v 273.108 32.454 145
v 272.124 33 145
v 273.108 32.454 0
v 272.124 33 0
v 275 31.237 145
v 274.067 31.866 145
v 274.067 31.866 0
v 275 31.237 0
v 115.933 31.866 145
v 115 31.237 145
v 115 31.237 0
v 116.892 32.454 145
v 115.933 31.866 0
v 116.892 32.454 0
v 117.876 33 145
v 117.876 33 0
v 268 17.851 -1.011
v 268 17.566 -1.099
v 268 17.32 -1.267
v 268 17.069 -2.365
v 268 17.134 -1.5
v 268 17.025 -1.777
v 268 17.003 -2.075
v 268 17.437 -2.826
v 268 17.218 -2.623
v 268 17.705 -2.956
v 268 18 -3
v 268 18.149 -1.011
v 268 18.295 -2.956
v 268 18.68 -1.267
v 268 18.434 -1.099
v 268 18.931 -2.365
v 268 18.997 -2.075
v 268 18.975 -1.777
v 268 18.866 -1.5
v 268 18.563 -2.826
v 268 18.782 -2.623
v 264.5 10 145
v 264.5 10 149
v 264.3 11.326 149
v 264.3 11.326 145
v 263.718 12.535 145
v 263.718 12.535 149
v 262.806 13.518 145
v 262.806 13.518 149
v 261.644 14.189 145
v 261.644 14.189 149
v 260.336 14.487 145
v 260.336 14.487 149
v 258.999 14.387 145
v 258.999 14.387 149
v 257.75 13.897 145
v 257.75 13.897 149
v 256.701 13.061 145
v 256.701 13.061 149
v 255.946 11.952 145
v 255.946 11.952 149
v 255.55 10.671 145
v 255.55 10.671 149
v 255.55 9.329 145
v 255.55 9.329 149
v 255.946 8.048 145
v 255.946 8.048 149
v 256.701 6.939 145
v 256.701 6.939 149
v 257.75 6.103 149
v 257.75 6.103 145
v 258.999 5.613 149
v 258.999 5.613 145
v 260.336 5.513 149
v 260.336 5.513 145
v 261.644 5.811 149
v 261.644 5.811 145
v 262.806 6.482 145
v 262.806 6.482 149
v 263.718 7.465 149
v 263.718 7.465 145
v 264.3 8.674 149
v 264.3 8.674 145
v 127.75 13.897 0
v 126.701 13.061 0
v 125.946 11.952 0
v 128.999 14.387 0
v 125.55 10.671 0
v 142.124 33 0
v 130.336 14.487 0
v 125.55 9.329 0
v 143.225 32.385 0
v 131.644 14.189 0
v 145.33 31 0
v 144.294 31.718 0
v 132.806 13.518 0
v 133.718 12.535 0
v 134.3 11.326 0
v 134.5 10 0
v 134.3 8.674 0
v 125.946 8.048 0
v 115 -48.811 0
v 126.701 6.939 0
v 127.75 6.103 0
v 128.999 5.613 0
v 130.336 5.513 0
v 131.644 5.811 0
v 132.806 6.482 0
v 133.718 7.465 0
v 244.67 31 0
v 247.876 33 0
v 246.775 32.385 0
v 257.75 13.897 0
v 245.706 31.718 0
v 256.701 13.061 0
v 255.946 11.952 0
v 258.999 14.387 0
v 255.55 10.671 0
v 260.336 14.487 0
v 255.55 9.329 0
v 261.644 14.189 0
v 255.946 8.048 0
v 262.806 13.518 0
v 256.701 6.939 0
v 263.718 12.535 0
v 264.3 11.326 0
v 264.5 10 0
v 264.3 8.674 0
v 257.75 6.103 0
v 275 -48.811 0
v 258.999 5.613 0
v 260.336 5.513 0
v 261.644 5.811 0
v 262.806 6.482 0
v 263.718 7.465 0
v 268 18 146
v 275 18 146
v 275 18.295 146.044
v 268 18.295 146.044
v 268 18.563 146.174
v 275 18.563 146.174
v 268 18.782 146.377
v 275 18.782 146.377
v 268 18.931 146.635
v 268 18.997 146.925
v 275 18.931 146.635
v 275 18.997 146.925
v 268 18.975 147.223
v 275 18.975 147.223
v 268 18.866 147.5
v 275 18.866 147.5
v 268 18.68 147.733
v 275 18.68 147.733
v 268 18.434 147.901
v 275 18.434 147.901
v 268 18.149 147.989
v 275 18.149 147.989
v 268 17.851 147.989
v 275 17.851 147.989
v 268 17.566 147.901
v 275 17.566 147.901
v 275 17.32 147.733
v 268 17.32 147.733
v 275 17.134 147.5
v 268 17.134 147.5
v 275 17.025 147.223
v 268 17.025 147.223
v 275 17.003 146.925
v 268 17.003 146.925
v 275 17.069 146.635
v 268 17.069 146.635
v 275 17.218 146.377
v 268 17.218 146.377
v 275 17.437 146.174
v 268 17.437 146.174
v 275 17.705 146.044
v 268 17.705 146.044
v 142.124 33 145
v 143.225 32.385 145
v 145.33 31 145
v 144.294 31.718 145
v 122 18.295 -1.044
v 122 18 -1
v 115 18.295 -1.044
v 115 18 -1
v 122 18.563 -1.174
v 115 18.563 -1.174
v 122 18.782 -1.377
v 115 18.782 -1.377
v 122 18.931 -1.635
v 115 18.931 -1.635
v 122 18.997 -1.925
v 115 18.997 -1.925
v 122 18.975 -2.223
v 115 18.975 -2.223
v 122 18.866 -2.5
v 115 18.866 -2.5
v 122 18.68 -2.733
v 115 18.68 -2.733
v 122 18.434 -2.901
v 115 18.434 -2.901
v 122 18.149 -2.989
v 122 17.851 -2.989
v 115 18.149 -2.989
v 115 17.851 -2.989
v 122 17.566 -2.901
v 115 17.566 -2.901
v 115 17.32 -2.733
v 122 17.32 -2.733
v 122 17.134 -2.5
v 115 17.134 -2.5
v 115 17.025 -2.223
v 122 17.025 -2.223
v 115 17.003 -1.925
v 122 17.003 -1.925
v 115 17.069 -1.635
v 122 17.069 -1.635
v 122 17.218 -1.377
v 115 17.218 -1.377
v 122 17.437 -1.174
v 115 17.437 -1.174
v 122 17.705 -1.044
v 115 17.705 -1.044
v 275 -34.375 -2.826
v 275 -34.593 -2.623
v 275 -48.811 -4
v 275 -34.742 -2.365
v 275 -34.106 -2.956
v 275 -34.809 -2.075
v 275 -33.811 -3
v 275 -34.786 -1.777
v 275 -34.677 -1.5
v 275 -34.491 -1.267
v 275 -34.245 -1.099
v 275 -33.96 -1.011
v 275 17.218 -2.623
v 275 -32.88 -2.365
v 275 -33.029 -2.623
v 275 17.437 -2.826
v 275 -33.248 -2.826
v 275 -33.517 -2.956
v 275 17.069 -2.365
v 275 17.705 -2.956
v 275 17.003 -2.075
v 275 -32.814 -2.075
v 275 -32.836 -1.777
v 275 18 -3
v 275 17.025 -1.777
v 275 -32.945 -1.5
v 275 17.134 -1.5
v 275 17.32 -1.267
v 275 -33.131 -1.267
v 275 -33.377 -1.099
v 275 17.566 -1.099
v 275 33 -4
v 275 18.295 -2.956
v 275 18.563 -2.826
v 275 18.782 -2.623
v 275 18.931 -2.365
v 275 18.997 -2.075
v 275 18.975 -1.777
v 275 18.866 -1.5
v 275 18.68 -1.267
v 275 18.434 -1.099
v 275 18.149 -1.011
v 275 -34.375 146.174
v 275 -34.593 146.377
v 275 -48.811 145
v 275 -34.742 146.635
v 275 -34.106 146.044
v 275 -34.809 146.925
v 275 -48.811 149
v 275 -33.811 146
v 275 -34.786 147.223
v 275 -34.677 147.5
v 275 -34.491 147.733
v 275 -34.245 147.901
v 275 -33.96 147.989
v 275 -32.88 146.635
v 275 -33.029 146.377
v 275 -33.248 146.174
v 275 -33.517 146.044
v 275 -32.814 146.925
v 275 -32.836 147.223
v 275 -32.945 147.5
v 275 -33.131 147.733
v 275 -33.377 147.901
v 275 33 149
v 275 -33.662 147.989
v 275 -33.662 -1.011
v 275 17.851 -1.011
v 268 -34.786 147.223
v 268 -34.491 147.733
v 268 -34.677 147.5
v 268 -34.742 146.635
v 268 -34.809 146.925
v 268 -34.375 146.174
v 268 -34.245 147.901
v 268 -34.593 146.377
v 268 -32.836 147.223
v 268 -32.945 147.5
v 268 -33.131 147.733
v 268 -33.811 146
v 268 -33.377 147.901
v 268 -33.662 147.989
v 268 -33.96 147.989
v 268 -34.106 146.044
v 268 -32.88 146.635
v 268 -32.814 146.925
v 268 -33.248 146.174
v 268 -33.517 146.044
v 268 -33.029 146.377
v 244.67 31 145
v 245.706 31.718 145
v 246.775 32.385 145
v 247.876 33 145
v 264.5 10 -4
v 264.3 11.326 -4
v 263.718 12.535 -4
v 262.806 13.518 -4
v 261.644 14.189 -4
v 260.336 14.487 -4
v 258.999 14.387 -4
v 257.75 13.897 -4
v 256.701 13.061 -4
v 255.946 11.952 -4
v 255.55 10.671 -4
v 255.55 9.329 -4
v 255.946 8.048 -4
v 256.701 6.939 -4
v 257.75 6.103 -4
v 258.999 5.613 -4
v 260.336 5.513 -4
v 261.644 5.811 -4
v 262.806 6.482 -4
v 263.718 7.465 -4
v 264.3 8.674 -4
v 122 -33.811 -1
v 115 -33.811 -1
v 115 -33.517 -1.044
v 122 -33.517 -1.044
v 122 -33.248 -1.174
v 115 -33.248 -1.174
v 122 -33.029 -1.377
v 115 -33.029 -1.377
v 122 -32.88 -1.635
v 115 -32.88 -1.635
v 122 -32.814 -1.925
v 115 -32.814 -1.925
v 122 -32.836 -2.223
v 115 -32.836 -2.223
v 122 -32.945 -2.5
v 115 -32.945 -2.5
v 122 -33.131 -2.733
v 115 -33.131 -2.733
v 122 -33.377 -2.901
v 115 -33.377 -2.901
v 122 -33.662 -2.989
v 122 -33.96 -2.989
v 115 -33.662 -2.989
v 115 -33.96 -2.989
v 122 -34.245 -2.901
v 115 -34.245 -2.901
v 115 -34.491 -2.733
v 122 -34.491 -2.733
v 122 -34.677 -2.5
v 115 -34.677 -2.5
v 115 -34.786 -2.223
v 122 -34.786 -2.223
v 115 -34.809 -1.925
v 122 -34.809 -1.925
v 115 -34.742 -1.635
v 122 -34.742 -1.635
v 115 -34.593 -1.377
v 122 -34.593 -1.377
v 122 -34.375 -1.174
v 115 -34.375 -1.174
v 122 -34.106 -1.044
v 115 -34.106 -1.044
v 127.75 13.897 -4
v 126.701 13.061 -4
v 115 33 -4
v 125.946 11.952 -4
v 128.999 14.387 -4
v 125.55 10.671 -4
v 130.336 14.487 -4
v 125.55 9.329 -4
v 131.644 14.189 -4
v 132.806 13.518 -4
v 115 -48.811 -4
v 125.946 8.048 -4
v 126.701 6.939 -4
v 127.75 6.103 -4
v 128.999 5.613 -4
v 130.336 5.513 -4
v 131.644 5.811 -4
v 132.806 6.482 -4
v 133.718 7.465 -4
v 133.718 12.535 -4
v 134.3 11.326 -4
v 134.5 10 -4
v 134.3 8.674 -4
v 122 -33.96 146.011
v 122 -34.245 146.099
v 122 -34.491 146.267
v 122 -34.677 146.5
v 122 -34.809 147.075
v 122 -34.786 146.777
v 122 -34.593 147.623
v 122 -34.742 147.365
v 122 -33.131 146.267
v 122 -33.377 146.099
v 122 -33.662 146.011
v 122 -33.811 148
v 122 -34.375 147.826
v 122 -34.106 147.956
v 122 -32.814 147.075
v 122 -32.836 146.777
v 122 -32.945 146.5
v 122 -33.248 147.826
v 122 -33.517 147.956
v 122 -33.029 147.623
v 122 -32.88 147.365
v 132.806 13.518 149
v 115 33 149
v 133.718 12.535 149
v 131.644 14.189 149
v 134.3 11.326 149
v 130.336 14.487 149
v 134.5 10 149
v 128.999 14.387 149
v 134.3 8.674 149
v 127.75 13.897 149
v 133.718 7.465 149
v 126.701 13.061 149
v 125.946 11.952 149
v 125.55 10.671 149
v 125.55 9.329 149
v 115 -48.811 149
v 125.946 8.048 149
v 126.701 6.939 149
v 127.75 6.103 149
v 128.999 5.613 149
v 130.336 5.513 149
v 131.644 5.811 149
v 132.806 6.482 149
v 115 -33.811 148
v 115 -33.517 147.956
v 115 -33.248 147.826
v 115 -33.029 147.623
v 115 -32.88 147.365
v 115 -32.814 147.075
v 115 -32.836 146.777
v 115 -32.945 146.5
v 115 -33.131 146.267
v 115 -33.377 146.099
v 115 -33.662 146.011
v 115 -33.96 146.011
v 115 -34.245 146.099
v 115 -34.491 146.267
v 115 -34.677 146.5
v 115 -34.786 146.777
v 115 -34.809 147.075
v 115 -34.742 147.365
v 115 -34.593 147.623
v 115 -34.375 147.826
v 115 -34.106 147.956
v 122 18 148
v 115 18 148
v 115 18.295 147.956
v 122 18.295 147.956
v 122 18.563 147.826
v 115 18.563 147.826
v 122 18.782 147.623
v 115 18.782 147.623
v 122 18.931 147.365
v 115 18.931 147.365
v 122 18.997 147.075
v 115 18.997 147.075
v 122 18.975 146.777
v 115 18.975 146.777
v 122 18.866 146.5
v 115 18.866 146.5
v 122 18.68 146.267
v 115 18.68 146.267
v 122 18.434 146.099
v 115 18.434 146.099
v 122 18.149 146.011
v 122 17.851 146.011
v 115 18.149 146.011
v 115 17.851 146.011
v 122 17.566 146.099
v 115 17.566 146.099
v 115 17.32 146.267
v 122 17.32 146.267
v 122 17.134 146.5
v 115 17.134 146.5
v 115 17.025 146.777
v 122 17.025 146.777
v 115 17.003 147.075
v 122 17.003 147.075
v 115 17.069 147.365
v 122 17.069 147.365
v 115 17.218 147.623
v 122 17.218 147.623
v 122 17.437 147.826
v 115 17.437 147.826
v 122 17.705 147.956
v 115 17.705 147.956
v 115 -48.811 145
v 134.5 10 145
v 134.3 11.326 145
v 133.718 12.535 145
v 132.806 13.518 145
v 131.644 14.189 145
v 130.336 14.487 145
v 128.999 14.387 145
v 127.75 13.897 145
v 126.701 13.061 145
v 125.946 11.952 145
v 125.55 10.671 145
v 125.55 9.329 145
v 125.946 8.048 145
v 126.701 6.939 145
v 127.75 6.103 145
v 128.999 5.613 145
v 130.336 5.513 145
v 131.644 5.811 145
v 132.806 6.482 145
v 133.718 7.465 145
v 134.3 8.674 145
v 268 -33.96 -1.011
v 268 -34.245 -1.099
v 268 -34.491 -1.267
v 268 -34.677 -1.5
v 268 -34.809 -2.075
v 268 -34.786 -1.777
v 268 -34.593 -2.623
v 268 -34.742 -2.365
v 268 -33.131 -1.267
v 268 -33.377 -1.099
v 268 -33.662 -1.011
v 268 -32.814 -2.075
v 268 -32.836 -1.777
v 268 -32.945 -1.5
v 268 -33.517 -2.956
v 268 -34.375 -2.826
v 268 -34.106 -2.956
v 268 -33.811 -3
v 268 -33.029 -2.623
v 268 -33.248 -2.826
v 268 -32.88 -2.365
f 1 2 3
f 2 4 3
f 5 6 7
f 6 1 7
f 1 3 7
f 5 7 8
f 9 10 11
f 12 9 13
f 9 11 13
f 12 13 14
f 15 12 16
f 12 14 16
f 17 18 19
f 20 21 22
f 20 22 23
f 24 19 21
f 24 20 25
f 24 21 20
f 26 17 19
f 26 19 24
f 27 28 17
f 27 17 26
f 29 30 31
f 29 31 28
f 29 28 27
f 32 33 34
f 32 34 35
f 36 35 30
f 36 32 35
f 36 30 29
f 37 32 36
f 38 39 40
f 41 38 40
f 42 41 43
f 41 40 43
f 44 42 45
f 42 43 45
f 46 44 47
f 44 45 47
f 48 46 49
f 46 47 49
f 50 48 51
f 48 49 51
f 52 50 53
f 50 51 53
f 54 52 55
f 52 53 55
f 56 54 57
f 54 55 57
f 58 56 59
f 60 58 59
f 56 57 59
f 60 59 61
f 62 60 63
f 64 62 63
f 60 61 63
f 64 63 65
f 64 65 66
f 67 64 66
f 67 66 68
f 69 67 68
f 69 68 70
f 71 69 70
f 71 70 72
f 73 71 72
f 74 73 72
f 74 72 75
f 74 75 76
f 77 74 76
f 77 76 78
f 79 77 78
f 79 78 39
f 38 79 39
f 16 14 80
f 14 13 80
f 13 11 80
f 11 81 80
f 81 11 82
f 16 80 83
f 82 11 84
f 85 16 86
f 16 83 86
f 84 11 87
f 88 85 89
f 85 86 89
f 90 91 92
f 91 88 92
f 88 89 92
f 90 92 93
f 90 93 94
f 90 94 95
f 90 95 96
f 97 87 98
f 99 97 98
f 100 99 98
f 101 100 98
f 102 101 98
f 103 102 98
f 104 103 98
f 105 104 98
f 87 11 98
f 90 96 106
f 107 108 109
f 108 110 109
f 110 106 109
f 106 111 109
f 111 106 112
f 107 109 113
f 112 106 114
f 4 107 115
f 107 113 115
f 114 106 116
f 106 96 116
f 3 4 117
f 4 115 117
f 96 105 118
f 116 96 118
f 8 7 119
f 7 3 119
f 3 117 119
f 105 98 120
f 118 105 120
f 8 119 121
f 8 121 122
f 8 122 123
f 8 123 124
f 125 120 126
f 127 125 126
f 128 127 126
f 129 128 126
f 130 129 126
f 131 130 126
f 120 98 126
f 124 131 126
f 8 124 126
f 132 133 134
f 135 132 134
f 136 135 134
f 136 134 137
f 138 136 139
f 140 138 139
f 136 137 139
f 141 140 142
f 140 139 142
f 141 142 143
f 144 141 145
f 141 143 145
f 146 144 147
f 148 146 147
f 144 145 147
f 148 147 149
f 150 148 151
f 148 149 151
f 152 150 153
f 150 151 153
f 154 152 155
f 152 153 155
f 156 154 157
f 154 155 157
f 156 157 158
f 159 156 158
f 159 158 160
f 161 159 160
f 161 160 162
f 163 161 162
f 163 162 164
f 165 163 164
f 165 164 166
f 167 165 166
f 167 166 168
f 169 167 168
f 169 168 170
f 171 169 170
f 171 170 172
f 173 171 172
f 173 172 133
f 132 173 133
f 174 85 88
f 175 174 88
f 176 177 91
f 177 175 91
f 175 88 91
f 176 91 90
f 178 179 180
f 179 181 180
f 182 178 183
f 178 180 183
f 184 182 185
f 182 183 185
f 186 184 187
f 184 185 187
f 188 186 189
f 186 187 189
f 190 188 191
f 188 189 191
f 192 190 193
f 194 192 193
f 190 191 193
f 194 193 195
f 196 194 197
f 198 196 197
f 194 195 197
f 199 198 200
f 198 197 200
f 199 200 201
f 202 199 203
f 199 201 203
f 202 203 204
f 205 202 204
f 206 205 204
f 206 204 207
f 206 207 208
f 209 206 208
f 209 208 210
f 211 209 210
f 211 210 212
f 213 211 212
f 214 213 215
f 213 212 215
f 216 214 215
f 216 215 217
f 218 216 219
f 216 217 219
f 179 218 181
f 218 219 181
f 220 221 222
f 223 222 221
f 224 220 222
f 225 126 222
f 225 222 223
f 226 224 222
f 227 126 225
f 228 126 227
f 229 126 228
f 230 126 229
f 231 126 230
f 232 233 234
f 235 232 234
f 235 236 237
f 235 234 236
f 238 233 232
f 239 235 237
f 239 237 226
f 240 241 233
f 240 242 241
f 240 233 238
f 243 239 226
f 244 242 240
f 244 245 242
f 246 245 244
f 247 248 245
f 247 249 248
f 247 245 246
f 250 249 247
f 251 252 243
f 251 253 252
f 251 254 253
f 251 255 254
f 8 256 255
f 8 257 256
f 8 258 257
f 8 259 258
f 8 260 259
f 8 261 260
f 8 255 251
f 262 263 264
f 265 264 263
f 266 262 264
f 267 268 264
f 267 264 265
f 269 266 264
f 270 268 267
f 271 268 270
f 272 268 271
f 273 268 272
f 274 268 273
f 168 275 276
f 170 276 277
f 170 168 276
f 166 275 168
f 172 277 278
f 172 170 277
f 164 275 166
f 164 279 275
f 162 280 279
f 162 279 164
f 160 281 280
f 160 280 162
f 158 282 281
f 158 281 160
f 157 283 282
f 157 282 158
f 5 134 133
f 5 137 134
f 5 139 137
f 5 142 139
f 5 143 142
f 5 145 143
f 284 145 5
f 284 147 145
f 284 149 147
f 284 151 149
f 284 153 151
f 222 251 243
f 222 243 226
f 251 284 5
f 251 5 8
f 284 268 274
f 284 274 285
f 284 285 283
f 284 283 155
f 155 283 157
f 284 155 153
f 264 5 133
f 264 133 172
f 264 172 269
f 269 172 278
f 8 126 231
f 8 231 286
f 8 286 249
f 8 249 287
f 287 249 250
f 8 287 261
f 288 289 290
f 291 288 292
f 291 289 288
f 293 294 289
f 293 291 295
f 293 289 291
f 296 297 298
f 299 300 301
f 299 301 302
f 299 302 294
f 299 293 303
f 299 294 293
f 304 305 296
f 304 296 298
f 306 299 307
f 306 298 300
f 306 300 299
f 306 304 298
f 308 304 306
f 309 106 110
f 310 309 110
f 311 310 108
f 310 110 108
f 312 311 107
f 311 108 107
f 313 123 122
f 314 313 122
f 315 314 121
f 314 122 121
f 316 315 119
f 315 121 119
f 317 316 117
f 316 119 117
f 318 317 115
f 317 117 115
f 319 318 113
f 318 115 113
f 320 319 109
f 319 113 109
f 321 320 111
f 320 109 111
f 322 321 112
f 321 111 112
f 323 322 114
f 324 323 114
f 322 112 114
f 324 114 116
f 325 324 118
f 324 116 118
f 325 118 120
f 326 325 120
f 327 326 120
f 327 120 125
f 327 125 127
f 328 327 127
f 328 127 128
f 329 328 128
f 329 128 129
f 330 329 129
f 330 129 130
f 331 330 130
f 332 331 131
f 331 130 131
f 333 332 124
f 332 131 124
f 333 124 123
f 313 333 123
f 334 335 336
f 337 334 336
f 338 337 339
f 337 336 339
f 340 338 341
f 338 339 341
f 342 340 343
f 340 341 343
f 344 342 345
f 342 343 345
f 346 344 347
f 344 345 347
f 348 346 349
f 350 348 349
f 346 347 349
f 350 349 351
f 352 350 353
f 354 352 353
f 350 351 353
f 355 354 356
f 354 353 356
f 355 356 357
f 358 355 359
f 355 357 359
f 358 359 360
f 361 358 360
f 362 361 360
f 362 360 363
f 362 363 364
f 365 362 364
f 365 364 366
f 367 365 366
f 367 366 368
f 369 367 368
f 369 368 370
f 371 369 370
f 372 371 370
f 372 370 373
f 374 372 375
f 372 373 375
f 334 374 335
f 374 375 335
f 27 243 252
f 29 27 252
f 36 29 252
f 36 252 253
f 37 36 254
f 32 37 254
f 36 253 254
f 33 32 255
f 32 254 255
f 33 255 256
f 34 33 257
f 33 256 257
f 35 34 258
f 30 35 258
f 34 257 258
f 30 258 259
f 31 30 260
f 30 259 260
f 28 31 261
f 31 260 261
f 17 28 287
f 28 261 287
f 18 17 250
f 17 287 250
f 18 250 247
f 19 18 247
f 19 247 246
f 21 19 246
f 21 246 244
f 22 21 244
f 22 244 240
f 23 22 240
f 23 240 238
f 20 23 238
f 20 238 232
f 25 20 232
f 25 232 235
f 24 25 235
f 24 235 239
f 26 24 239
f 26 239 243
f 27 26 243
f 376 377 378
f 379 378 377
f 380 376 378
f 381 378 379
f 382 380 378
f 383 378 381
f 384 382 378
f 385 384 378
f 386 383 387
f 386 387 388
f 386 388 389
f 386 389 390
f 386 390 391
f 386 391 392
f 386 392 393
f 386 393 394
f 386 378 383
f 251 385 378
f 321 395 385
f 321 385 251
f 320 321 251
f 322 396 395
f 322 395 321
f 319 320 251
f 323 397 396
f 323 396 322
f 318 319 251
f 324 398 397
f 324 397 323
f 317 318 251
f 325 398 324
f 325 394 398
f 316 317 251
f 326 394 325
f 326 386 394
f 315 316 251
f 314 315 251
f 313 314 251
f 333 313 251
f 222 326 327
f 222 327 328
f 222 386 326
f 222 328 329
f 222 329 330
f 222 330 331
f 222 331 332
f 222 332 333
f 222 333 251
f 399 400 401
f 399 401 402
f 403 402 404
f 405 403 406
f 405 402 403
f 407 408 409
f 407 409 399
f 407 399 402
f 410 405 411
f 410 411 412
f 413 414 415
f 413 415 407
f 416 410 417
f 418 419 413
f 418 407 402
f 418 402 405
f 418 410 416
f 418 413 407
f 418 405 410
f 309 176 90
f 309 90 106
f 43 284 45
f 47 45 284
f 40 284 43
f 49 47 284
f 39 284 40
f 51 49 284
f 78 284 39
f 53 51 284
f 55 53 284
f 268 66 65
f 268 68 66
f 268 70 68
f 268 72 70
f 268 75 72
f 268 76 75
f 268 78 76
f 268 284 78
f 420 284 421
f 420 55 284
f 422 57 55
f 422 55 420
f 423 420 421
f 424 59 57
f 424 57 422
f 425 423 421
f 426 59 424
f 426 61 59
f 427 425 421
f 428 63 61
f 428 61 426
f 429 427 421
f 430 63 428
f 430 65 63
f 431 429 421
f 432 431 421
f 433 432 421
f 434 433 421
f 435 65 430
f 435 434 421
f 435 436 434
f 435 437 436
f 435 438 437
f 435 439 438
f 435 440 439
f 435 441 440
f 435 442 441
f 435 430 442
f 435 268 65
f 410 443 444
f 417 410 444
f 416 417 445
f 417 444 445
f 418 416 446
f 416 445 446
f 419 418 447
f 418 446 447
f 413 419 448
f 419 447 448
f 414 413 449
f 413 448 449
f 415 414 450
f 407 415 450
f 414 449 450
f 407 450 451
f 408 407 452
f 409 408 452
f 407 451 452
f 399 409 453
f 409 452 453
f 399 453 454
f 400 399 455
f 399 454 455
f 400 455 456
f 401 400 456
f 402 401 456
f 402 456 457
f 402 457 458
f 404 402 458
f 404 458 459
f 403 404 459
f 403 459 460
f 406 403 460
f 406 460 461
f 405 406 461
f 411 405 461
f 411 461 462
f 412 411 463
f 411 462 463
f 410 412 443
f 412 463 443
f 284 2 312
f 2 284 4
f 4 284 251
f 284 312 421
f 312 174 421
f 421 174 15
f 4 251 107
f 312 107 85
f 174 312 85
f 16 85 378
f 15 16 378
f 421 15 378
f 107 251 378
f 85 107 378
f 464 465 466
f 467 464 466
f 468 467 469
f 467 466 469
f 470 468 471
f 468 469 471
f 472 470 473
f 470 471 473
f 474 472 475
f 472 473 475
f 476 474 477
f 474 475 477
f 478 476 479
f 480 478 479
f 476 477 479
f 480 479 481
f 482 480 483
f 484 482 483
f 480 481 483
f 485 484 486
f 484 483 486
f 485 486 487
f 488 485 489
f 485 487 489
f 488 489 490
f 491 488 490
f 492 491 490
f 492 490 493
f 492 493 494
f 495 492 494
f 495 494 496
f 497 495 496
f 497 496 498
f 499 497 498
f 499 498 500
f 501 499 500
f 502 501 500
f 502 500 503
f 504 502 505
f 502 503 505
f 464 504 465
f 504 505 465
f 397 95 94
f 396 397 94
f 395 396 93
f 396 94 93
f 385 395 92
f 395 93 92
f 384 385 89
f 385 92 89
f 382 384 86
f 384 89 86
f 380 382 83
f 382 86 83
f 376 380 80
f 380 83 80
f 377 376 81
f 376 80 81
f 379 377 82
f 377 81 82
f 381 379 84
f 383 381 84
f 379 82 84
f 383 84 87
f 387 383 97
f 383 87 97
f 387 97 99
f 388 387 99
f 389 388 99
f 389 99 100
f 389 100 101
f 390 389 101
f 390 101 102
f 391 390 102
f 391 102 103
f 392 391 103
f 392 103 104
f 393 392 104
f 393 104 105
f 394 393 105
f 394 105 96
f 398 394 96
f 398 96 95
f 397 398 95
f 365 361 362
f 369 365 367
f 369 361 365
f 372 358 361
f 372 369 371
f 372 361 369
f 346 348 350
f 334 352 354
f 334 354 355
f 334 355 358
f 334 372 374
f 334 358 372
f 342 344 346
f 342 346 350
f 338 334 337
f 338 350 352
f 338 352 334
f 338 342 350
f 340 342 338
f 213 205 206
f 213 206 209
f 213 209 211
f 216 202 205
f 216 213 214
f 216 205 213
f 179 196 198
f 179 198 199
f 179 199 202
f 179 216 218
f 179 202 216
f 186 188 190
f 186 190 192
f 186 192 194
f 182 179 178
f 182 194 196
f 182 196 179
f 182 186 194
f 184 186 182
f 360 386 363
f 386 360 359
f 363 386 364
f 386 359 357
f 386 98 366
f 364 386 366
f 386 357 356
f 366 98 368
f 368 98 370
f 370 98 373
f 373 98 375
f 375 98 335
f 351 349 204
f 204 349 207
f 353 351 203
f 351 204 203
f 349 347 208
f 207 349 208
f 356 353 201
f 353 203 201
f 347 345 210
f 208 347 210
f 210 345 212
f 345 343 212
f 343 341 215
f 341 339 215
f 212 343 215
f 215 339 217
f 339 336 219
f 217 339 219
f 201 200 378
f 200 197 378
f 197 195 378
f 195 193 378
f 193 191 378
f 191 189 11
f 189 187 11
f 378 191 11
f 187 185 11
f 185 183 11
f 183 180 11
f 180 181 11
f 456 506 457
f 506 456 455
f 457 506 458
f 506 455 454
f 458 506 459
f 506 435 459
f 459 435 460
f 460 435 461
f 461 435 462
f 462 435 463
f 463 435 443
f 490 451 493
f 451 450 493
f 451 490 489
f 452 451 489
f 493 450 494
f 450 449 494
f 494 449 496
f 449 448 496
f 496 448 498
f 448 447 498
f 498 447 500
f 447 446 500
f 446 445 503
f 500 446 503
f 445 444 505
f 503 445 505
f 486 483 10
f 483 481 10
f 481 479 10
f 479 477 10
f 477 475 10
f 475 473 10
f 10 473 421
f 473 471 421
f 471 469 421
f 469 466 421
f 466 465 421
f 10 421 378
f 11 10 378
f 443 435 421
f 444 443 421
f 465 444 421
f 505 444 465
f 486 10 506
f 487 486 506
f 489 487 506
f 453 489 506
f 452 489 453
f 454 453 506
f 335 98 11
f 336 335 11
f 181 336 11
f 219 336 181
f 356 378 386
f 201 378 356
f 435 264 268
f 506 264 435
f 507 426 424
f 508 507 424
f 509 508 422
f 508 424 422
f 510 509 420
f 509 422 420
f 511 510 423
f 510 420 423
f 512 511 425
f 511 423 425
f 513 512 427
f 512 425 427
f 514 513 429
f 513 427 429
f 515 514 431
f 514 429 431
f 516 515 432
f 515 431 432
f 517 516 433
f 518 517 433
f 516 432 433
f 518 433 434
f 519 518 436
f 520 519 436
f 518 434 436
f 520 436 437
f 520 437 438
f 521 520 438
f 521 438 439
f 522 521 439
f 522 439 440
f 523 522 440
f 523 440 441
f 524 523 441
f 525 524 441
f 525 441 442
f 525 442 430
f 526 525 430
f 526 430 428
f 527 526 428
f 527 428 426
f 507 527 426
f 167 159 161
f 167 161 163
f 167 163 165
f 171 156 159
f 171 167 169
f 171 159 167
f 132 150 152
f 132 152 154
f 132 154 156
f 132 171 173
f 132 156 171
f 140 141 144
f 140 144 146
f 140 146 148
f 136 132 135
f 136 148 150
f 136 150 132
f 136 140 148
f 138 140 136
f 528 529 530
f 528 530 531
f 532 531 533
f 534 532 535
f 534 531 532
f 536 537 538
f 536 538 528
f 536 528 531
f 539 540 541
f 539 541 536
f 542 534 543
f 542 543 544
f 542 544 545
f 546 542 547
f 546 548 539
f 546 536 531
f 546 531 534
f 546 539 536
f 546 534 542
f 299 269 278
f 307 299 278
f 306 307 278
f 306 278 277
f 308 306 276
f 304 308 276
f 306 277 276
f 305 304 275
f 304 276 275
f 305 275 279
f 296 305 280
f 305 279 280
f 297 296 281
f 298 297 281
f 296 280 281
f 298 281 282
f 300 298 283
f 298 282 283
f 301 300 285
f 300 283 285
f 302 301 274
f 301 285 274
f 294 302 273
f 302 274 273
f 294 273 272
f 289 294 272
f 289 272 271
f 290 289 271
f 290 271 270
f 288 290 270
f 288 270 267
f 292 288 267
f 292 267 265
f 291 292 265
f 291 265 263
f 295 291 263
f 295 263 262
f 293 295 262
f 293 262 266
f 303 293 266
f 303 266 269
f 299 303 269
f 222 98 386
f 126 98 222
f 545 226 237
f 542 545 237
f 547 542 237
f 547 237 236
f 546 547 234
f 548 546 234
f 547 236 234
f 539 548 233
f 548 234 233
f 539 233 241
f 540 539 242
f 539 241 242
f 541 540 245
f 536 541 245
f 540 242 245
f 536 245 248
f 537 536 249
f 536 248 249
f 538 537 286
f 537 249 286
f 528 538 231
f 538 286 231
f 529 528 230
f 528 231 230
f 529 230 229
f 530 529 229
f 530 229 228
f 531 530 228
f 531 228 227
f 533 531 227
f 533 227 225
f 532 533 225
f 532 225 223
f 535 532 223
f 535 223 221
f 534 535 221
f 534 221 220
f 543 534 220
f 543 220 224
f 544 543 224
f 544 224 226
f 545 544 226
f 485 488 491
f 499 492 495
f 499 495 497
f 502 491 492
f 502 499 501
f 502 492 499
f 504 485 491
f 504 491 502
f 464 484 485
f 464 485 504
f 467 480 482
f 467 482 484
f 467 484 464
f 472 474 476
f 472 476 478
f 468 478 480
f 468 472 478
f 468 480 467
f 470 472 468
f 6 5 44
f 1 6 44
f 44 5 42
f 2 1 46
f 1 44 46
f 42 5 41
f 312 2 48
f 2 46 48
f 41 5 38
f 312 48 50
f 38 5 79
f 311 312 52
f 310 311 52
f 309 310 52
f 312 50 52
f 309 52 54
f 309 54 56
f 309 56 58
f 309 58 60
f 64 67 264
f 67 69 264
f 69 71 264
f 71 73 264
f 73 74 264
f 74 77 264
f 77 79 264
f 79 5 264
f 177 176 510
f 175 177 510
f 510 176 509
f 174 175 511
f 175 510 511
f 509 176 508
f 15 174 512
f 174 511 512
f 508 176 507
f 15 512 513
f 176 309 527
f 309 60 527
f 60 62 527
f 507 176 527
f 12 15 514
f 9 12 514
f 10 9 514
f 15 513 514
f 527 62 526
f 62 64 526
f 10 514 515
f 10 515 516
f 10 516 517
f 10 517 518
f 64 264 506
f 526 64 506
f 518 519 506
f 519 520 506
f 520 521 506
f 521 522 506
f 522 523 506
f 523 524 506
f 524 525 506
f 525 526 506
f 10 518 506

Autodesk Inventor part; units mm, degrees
sketch "Szkic1" plane through (0, 0, 0) normal (0, 0, 1) x (1, 0, 0)
  arc A0 (0, 35) -> (0, -35) centre (0, 0) ccw construction
  line L0 (0, 35) -> (390, 35) construction
  line L1 (0, -35) -> (390, -35) construction
  arc A1 (390, -35) -> (390, 35) centre (390, 0) ccw construction
  circle A2 centre (0, 0) radius 4.5
  circle A3 centre (390, 0) radius 4.5
  line L2 (130, 35) -> (130, 10) construction
  line L3 (260, 35) -> (260, 10) construction
  circle A4 centre (130, 10) radius 25 construction
  circle A5 centre (260, 10) radius 25 construction
  circle A6 centre (130, 10) radius 4.5
  circle A7 centre (260, 10) radius 4.5
  circle A8 centre (0, 0) radius 35 construction
  circle A9 centre (390, 0) radius 35 construction
  line L4 (117.8756, 33) -> (31.8551, 33)
  line L5 (375.6125, 33) -> (272.1244, 33)
  line L6 (247.8756, 33) -> (142.1244, 33)
  line L7 (31.8551, 31) -> (114.6703, 31)
  line L8 (145.3297, 31) -> (244.6703, 31)
  line L9 (275.3297, 31) -> (371.697, 31)
  arc A10 (375.6125, 33) -> (371.697, 31) centre (390, 0) ccw
  arc A11 (117.8756, 33) -> (114.6703, 31) centre (130, 10) ccw
  arc A12 (145.3297, 31) -> (142.1244, 33) centre (130, 10) ccw
  arc A13 (247.8756, 33) -> (244.6703, 31) centre (260, 10) ccw
  arc A14 (275.3297, 31) -> (272.1244, 33) centre (260, 10) ccw
  line L10 (31.8551, 14.5) -> (31.8551, 35) construction
  line L11 (31.8551, 33) -> (31.8551, 31)
  line L12 (260, 10) -> (260, 0)
  line L13 (130, 10) -> (130, 0)
  point P0 (423.5971, -9.8098)
  dimension "d94" = 50
  dimension "d0" = 70
  dimension "d1" = 390
  dimension "d2" = 390
  dimension "d3" = 70
  dimension "d4" = 9
  dimension "d5" = 9
  dimension "d10" = 25
  dimension "d11" = 25
  dimension "d12" = 9
  dimension "d13" = 9
  dimension "d14" = 130
  dimension "d15" = 260
  dimension "d24" = 2
  dimension "d25" = 2
  dimension "d26" = 2
  dimension "d27" = 1
  dimension "d95" = 2
extrude "Wyciągnięcie proste1" add sketch "Szkic1" along normal blind 145 contours A11 L7 L11 L4 | A10 L9 A14 L5 | A13 L8 A12 L6
ref_plane "Płaszczyzna konstrukcyjna1" through (117.8756, 33, 145) normal (0, 0, 1) x (-1, 0, 0)
sketch "Szkic3" plane through (117.8756, 33, 145) normal (0, 0, 1) x (-1, 0, 0)
  circle A0 centre (117.8756, 33) radius 4.5 projected
  arc A1 (133.7659, 28.5) -> (133.7659, 37.5) centre (133.7659, 33) ccw
  arc A2 (98.6659, 37.5) -> (98.6659, 28.5) centre (98.6659, 33) ccw
  line L0 (133.7659, 28.5) -> (98.6659, 28.5)
  line L1 (98.6659, 37.5) -> (133.7659, 37.5)
  line L2 (98.6659, 18.5) -> (133.7659, 18.5)
  arc A3 (133.7659, 18.5) -> (133.7659, 47.5) centre (133.7659, 33) ccw
  line L3 (133.7659, 47.5) -> (98.6659, 47.5)
  line L4 (86.0205, 18.5) -> (86.0205, -2) construction
  line L5 (98.6659, 18.5) -> (86.0205, 18.5)
  line L6 (98.6659, 47.5) -> (86.0205, 47.5)
  line L7 (86.0205, 0) -> (86.0205, 2) projected
  line L8 (86.0205, 18.5) -> (86.0205, 0)
  line L9 (98.6659, 47.5) -> (98.6659, 81.8113)
  line L10 (98.6659, 81.8113) -> (-234.1244, 81.8113)
  line L11 (-157.4541, 2) -> (-253.8214, 2) projected
  line L12 (86.0205, 0) -> (86.0205, 2)
  line L13 (-257.7369, 0) -> (-154.2487, 0) projected
  line L14 (86.0205, 0) -> (-238.0399, 0)
  circle A4 centre (-272.1244, 33) radius 35 construction
  line L15 (-234.1244, 2) -> (-234.1244, 18.5)
  line L16 (-234.1244, 2) -> (-238.0399, 0)
  line L17 (-246.7694, 47.5) -> (-246.7694, 81.8113)
  line L18 (-246.7694, 81.8113) -> (-234.1244, 81.8113)
  line L19 (-303.9795, 47.5) -> (-409.6259, 47.5) construction
  line L20 (-234.1244, 47.5) -> (-246.7694, 47.5)
  line L21 (-234.1244, 18.5) -> (-281.8694, 18.5)
  line L22 (-246.7694, 47.5) -> (-281.8694, 47.5)
  arc A5 (-281.8694, 47.5) -> (-281.8694, 18.5) centre (-281.8694, 33) ccw
  point P0 (-238.0399, 0)
  dimension "d33" = 9
  dimension "d34" = 9
  dimension "d35" = 10
  dimension "d36" = 47.7454
  dimension "d37" = 12.6455
  dimension "d38" = 12.6455
  dimension "d39" = 12.6455
  dimension "d40" = 0
  dimension "d64" = 47.745
  dimension "d93" = 16.5
extrude "Wyciągnięcie proste2" add sketch "Szkic3" along normal blind 4
ref_plane "Płaszczyzna konstrukcyjna4" through (117.8756, 33, 72.5) normal (0, 0, -1) x (-1, 0, 0)
mirror "Odbij2" about plane through (117.8756, 33, 72.5) normal (0, 0, -1) of "Wyciągnięcie proste2"
extrude "Wyciągnięcie proste4" cut sketch "Szkic1" along normal mid plane 10000 contours A6 | A7
sketch "Szkic8" plane through (0, 0, 145) normal (0, 0, 1) x (1, 0, 0)
  line L0 (352, 31) -> (371.697, 31) projected
  line L1 (352, 31) -> (355.9155, 33) projected
  line L2 (352, 31) -> (355.9155, 33)
  line L3 (375.6125, 33) -> (355.9155, 33) projected
  line L4 (355.9155, 33) -> (375.6125, 33)
  arc A0 (375.6125, 33) -> (371.697, 31) centre (390, 0) ccw projected
  line L5 (375.6125, 33) -> (371.697, 31)
  line L6 (352, 14.5) -> (352, 31) projected
  line L7 (371.697, 31) -> (352, 31)
  point P0 (0, 0)
  point P1 (352, -48.8113)
ref_plane "Płaszczyzna konstrukcyjna6" through (0, 0, 72.5) normal (0, 0, 1) x (1, 0, 0)
extrude "Wyciągnięcie proste5" cut sketch "Szkic8" along normal mid plane 1000 contours L1 L3 A0 L0
ref_plane "Płaszczyzna konstrukcyjna9" through (117.8756, 33, 149) normal (0, 0, 1) x (1, 0, 0)
sketch "Szkic12" plane through (117.8756, 33, 149) normal (0, 0, 1) x (1, 0, 0)
  line L0 (281.8694, -18.5) -> (234.1244, -18.5) projected
  arc A0 (281.8694, -47.5) -> (281.8694, -18.5) centre (281.8694, -33) ccw projected
  line L1 (246.7694, -47.5) -> (281.8694, -47.5) projected
  line L2 (246.7694, -81.8113) -> (246.7694, -47.5) projected
  line L3 (234.1244, -2) -> (234.1244, -81.8113) projected
  line L4 (-98.6659, -81.8113) -> (246.7694, -81.8113) projected
  point P0 (-117.8756, -33)
extrude "Wyciągnięcie proste7" cut sketch "Szkic12" against normal blind 17
extrude "Wyciągnięcie proste8" cut sketch "Szkic1" against normal blind 17 contours A3
ref_plane "Płaszczyzna konstrukcyjna10" through (117.8756, 33, 149) normal (0, 0, 1) x (1, 0, 0)
sketch "Szkic13" plane through (117.8756, 33, 149) normal (0, 0, 1) x (1, 0, 0)
  line L0 (234.1244, -81.8113) -> (234.1244, -2) projected
  line L1 (232.1244, -81.8113) -> (232.1244, -2)
  line L2 (234.1244, -2) -> (238.0399, 0) projected
  line L3 (238.0399, 0) -> (236.0399, 0)
  line L4 (238.0399, 0) -> (-86.0205, 0) projected
  line L5 (236.0399, 0) -> (232.1244, -2)
  line L6 (238.0399, 0) -> (234.1244, -2)
  line L7 (234.1244, -81.8113) -> (232.1244, -81.8113)
  line L8 (-98.6659, -81.8113) -> (246.7694, -81.8113) projected
  point P0 (-117.8756, -33)
  dimension "d70" = 2
  dimension "d71" = 2
extrude "Wyciągnięcie proste9" add sketch "Szkic13" along normal blind 17
ref_plane "Płaszczyzna konstrukcyjna11" through (117.8756, 33, 166) normal (0, 0, 1) x (1, 0, 0)
sketch "Szkic14" plane through (117.8756, 33, 166) normal (0, 0, 1) x (1, 0, 0)
  line L0 (232.1244, -81.8113) -> (234.1244, -81.8113) projected
  line L1 (-98.6659, -81.8113) -> (246.7694, -81.8113) projected
  line L2 (232.1244, -81.8113) -> (246.7694, -81.8113)
  line L3 (246.7694, -81.8113) -> (246.7694, -47.5) projected
  line L4 (246.7694, -81.8113) -> (246.7694, -47.5)
  line L5 (246.7694, -47.5) -> (281.8694, -47.5) projected
  line L6 (246.7694, -47.5) -> (281.8694, -47.5)
  line L7 (281.8694, -18.5) -> (234.1244, -18.5) projected
  line L8 (234.1244, -81.8113) -> (234.1244, -2) projected
  arc A0 (281.8694, -47.5) -> (281.8694, -18.5) centre (281.8694, -33) ccw projected
  circle A1 centre (272.1244, -33) radius 4.5 projected
  line L9 (232.1244, -2) -> (232.1244, -81.8113) projected
  line L10 (236.0399, 0) -> (232.1244, -2) projected
  line L11 (238.0399, 0) -> (236.0399, 0) projected
  line L12 (234.1244, -2) -> (238.0399, 0) projected
  point P0 (-117.8756, -33)
extrude "Wyciągnięcie proste10" add sketch "Szkic14" along normal blind 4
ref_plane "Płaszczyzna konstrukcyjna12" through (364.645, -48.8113, -4) normal (0, 0, -1) x (-1, 0, 0)
sketch "Szkic15" plane through (364.645, -48.8113, -4) normal (0, 0, -1) x (-1, 0, 0)
  line L0 (332.7899, 63.3113) -> (322.7899, 63.3113)
  line L1 (322.7899, 63.3113) -> (322.7899, 34.3113)
  line L2 (322.7899, 34.3113) -> (332.7899, 34.3113)
  line L3 (332.7899, 34.3113) -> (332.7899, 63.3113)
  point P0 (364.645, 48.8113)
  dimension "d78" = 10
extrude "Wyciągnięcie proste11" add sketch "Szkic15" along normal blind 14.44
ref_plane "Płaszczyzna konstrukcyjna13" through (117.8756, 33, 149) normal (0, 0, 1) x (1, 0, 0)
sketch "Szkic16" plane through (117.8756, 33, 149) normal (0, 0, 1) x (1, 0, 0)
  line L0 (-86.0205, -18.5) -> (-133.7659, -18.5) projected
  line L1 (-86.0205, -47.5) -> (-76.0205, -47.5) projected
  line L2 (-86.0205, -18.5) -> (-76.0205, -18.5)
  line L3 (-76.0205, -18.5) -> (-76.0205, -47.5)
  line L4 (-76.0205, -47.5) -> (-86.0205, -47.5)
  line L5 (-86.0205, -47.5) -> (-86.0205, -18.5)
  point P0 (-117.8756, -33)
  point P1 (-86.0205, -47.5)
  dimension "d82" = 10
extrude "Wyciągnięcie proste12" add sketch "Szkic16" along normal blind 14.44
ref_plane "Płaszczyzna konstrukcyjna14" through (31.8551, -14.5, -4) normal (-1, 0, 0) x (0, 0, 1)
sketch "Szkic17" plane through (31.8551, -14.5, -4) normal (-1, 0, 0) x (0, 0, 1)
  line L0 (4, 0) -> (4, 29) projected
  line L1 (4, 19) -> (-14.44, 19)
  line L2 (-14.44, 29) -> (-14.44, 0) projected
  line L3 (4, 10) -> (0, 10) projected
  line L4 (4, 10) -> (-12.44, 10)
  line L5 (4, 18.5) -> (-12.44, 18.5)
  line L6 (-12.44, 18.5) -> (-4.44, 18.5)
  line L7 (-4.44, 18.5) -> (-4.44, 10.5)
  line L8 (-4.44, 10.5) -> (-12.44, 10.5)
  line L9 (-12.44, 10.5) -> (-12.44, 18.5)
  circle A0 centre (-8.44, 14.5) radius 2.5
  point P0 (4, 14.5)
  dimension "d86" = 9
  dimension "d87" = 0.5
  dimension "d88" = 8
  dimension "d89" = 8
  dimension "d90" = 5
extrude "Wyciągnięcie proste13" cut sketch "Szkic17" against normal through all contours A0
mirror "Odbij3" about plane through (117.8756, 33, 72.5) normal (0, 0, -1) of "Wyciągnięcie proste13"
ref_plane "Płaszczyzna konstrukcyjna15" through (364.645, -48.8113, -4) normal (0, 0, -1) x (-1, 0, 0)
sketch "Szkic19" plane through (364.645, -48.8113, -4) normal (0, 0, -1) x (-1, 0, 0)
  circle A0 centre (234.645, 58.8113) radius 4.5 projected
  line L0 (234.645, 58.8113) -> (249.645, 58.8113)
  circle A1 centre (104.645, 58.8113) radius 4.5 projected
  line L1 (104.645, 58.8113) -> (89.645, 58.8113)
  line L2 (89.645, 101.2973) -> (-85.4155, 101.2973)
  line L3 (-85.4155, 101.2973) -> (-85.4155, -16.8317)
  line L4 (-85.4155, -16.8317) -> (89.645, -16.8317)
  line L5 (89.645, -16.8317) -> (89.645, 101.2973)
  line L6 (249.645, 101.2973) -> (438.4161, 101.2973)
  line L7 (438.4161, 101.2973) -> (438.4161, -28.5413)
  line L8 (438.4161, -28.5413) -> (249.645, -28.5413)
  line L9 (249.645, -28.5413) -> (249.645, 101.2973)
  point P0 (364.645, 48.8113)
  dimension "d99" = 15
  dimension "d100" = 15
extrude "Wyciągnięcie proste14" cut sketch "Szkic19" along normal mid plane 682 contours L9 L6 L7 L8 | L5 L4 L3 L2
ref_plane "Płaszczyzna konstrukcyjna17" through (115, -48.8113, 149) normal (-1, 0, 0) x (0, 0, 1)
sketch "Szkic21" plane through (115, -48.8113, 149) normal (-1, 0, 0) x (0, 0, 1)
  line L0 (-149, 0) -> (-153, 0) projected
  line L1 (-151, 0) -> (-151, 15)
  line L2 (0, 0) -> (-4, 0) projected
  line L3 (-2, 0) -> (-2, 15)
  line L4 (0, 81.8113) -> (0, 0) projected
  line L5 (0, 81.8113) -> (-153, 81.8113) projected
  line L6 (-2, 81.8113) -> (-2, 66.8113)
  line L7 (-151, 81.8113) -> (-151, 66.8113)
  circle A0 centre (-151, 66.8113) radius 1
  circle A1 centre (-2, 66.8113) radius 1
  circle A2 centre (-2, 15) radius 1
  circle A3 centre (-151, 15) radius 1
  point P0 (-149, 48.8113)
  dimension "d112" = 15
  dimension "d113" = 15
  dimension "d114" = 15
  dimension "d115" = 2
  dimension "d116" = 2
  dimension "d117" = 2
  dimension "d118" = 2
extrude "Wyciągnięcie proste15" cut sketch "Szkic21" against normal blind 7
ref_plane "Płaszczyzna konstrukcyjna18" through (275, -48.8113, -4) normal (1, 0, 0) x (0, 0, -1)
sketch "Szkic22" plane through (275, -48.8113, -4) normal (1, 0, 0) x (0, 0, -1)
  circle A0 centre (-151, 66.8113) radius 1 projected
  circle A1 centre (-151, 15) radius 1 projected
  circle A2 centre (-2, 66.8113) radius 1 projected
  line L0 (-4, 80.0481) -> (-4, 0) projected
  circle A3 centre (-2, 15) radius 1 projected
  point P0 (-4, 48.8113)
extrude "Wyciągnięcie proste16" cut sketch "Szkic22" against normal blind 7
ref_plane "Płaszczyzna konstrukcyjna5" through (117.8756, 33, 72.5) normal (0, 0, -1) x (-1, 0, 0)
properties part number "Podstawacz2"
